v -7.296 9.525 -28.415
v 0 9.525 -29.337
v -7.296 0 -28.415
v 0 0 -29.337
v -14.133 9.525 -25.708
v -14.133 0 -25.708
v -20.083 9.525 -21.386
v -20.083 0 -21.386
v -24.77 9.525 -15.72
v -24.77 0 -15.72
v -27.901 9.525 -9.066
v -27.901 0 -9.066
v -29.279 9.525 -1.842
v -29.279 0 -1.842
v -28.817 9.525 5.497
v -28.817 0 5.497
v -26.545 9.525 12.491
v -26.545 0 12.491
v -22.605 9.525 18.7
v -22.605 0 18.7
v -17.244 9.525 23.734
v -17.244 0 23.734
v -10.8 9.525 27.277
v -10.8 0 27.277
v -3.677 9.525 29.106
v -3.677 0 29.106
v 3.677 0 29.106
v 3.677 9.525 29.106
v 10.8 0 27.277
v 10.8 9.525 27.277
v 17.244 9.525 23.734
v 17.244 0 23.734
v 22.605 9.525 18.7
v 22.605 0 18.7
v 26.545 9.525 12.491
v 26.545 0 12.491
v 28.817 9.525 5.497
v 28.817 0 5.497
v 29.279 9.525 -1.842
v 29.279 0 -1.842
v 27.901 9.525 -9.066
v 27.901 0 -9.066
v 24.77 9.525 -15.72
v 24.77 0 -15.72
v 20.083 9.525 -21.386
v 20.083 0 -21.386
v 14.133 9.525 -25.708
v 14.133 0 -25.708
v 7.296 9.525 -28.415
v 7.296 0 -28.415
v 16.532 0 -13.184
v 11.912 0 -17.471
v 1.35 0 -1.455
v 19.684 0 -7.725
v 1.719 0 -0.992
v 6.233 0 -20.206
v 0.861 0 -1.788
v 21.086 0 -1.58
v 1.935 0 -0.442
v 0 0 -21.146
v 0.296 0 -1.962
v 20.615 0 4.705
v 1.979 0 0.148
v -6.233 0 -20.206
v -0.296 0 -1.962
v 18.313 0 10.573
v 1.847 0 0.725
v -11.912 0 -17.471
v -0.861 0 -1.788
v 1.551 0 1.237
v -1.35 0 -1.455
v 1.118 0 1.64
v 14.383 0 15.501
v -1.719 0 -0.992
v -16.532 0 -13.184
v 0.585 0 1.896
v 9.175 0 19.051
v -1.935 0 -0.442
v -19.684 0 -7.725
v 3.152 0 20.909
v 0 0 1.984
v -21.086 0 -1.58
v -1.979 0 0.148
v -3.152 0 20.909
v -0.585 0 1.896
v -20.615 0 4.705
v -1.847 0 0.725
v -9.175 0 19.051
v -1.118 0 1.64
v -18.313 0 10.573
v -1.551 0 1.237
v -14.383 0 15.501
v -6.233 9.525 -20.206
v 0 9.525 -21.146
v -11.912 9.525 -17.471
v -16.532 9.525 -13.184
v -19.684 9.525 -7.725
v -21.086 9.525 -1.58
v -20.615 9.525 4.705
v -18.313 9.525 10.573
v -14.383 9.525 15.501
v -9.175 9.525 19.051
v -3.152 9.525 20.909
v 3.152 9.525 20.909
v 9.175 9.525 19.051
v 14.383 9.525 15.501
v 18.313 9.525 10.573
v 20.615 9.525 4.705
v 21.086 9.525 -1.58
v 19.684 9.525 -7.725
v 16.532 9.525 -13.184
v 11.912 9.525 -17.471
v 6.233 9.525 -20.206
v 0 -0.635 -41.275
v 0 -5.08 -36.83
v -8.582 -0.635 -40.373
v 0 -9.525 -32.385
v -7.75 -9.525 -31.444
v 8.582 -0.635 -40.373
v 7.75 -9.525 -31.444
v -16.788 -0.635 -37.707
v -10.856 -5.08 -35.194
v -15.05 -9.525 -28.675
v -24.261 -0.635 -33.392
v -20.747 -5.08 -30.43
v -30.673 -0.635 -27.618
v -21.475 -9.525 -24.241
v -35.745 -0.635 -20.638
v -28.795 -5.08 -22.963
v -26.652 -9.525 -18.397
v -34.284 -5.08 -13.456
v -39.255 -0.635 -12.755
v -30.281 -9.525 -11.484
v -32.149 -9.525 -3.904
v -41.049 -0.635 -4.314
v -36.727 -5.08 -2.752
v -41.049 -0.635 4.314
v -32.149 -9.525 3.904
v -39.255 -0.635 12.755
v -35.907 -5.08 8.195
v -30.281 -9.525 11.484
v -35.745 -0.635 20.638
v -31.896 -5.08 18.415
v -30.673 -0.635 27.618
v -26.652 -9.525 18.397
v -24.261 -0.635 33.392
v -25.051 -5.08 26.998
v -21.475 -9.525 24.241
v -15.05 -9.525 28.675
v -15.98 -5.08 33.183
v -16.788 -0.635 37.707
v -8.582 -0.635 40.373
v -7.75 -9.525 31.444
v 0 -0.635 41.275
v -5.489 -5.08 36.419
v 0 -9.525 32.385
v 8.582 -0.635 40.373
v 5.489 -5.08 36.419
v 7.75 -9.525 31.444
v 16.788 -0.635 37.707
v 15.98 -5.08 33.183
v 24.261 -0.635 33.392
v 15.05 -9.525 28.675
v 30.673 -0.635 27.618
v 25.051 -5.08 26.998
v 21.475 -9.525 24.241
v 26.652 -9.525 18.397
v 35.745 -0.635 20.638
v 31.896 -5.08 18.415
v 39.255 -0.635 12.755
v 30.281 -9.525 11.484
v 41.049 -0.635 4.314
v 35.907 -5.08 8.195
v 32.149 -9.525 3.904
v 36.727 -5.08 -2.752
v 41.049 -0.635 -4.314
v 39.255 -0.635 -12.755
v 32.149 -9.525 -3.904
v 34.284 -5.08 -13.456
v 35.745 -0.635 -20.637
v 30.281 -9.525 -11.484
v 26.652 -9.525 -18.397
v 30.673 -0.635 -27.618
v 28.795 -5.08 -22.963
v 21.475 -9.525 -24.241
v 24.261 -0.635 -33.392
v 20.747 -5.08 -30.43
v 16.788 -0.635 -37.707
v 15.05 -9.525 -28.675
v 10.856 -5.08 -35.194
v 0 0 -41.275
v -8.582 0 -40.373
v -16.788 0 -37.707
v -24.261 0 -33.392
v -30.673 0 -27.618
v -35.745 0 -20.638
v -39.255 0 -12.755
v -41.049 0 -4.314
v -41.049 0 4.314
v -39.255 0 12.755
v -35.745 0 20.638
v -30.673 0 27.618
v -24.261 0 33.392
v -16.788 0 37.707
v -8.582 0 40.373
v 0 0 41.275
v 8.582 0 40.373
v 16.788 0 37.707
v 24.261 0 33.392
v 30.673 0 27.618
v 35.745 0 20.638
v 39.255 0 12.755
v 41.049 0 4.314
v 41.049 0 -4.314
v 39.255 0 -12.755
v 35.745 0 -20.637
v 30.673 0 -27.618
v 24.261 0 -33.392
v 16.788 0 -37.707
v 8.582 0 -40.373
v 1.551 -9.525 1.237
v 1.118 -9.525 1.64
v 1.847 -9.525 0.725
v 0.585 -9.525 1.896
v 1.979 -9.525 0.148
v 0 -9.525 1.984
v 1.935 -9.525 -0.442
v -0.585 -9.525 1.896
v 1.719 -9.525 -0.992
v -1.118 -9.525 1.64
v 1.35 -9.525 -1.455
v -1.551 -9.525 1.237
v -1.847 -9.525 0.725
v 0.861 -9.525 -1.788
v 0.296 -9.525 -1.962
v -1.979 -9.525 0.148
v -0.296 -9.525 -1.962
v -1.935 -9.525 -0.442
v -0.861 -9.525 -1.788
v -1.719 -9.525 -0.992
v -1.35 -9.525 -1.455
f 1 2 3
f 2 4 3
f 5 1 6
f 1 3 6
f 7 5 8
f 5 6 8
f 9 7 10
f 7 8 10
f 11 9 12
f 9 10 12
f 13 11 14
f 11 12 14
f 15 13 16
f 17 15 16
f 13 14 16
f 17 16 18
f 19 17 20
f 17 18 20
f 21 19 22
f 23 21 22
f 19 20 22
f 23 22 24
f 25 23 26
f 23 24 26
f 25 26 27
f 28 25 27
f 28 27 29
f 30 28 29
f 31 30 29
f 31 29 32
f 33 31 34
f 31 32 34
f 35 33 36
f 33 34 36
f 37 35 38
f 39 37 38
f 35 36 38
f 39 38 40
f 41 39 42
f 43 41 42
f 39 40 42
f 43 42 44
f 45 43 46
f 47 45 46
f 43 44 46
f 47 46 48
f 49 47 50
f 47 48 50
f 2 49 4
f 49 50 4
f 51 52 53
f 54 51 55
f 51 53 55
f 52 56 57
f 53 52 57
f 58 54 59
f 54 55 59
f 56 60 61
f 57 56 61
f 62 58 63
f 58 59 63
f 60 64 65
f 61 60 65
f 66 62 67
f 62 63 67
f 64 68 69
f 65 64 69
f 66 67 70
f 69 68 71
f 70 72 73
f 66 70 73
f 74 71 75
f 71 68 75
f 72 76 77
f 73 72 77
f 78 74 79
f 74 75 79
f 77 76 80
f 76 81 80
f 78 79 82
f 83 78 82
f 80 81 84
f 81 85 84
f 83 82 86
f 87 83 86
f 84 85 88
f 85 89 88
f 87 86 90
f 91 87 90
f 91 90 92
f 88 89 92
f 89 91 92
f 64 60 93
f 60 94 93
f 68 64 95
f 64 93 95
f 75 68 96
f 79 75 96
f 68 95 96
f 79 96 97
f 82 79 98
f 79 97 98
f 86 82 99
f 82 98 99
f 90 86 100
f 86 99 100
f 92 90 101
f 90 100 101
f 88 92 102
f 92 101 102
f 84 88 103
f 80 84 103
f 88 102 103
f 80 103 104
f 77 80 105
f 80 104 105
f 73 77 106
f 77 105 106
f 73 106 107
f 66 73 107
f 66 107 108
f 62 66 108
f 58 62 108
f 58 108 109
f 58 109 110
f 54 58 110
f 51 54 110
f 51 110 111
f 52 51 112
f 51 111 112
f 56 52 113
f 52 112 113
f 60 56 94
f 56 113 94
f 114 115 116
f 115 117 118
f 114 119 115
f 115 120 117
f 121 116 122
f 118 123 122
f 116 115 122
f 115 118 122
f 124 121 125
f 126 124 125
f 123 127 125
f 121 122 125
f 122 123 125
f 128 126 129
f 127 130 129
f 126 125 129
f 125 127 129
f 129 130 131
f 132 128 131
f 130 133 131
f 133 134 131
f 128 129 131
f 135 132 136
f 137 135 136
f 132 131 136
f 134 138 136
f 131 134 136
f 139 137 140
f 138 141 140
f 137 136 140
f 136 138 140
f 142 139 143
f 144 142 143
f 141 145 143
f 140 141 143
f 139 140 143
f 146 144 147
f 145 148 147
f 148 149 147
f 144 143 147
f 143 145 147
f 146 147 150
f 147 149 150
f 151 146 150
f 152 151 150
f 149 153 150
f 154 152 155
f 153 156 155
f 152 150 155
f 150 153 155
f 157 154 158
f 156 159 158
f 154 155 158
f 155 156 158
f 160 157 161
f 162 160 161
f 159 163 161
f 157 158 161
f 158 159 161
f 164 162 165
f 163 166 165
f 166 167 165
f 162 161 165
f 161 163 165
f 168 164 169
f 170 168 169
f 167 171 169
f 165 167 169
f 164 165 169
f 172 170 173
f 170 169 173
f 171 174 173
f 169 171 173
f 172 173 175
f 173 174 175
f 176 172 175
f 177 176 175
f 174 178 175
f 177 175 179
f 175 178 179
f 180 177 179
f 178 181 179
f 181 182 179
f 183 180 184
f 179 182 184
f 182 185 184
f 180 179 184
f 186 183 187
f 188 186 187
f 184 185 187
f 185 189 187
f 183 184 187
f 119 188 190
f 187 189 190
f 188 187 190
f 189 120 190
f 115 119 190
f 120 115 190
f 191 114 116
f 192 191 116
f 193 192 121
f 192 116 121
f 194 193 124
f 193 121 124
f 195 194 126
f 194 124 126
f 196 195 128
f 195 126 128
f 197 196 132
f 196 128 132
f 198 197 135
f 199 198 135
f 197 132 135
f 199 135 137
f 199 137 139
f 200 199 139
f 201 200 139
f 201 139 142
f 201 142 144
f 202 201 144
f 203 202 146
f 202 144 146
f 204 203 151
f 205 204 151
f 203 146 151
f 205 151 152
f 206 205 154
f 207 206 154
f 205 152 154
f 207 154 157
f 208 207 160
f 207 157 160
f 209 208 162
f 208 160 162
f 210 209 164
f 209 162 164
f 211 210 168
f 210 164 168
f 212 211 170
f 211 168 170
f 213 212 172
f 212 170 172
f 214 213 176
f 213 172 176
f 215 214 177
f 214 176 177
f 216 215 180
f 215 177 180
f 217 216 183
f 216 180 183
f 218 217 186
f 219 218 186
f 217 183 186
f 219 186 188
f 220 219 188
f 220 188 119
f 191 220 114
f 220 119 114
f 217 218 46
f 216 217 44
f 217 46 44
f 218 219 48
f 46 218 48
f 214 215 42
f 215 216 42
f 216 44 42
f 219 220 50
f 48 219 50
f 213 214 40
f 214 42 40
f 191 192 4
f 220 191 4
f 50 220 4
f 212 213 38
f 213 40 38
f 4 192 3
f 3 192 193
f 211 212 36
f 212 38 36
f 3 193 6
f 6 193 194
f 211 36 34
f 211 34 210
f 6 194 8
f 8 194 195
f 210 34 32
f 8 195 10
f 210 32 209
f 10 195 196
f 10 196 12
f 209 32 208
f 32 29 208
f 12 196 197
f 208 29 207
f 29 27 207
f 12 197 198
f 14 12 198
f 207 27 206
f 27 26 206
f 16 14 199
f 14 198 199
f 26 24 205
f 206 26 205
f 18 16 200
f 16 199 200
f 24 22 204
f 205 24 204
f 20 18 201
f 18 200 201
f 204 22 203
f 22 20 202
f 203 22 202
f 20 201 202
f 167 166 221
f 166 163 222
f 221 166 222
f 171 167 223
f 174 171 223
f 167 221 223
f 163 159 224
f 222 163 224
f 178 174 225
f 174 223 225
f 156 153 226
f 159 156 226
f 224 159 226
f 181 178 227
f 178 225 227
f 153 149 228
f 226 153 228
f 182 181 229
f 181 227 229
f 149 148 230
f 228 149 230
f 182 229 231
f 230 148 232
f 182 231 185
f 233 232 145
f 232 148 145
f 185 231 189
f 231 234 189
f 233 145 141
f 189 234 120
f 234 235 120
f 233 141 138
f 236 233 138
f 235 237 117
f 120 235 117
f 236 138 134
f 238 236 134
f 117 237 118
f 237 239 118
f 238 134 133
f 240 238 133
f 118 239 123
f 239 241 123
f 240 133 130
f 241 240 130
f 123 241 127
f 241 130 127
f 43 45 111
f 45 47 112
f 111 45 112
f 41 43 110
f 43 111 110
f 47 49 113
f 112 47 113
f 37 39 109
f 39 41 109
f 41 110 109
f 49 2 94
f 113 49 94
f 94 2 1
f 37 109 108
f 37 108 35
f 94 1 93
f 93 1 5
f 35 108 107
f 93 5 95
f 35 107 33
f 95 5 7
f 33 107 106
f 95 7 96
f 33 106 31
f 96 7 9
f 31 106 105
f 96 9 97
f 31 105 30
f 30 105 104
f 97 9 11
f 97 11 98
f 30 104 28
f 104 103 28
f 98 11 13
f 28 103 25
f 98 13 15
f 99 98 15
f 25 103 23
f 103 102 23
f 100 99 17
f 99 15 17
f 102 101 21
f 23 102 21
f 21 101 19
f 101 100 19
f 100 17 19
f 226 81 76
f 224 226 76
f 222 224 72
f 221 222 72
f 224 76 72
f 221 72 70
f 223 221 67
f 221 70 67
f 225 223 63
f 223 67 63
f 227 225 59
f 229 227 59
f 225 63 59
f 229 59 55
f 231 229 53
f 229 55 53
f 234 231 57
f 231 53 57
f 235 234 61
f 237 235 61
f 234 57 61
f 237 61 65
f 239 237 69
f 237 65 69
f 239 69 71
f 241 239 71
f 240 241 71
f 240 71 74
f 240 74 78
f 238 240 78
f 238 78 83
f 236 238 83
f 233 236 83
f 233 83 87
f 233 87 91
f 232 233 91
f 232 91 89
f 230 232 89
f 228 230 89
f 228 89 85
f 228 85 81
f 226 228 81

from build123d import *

# Parameters (mm, degrees)
CHAMFER1_SIZE                   = 8.89
F_5_32_0_15625_DIAMETER_HOLE1_D = 3.96875


with BuildPart() as part:
    # Sketch1 → Revolve1 (revolve)
    with BuildSketch(Plane.XY, mode=Mode.PRIVATE) as revolve1_sk:
        Polygon((-29.337, 0), (-41.275, 0), (-41.275, -9.525), (0, -9.525), (0, 0), (-21.1455, 0), (-21.1455, 9.525), (-29.337, 9.525), align=None)
    revolve(revolve1_sk.sketch.rotate(Axis((0, -9.525, 0), (0, 1, 0)), 270), axis=Axis((0, -9.525, 0), (0, 1, 0)))

    # Chamfer1
    chamfer1_edges = [part.edges().sort_by_distance(p)[0] for p in [
        (0, -9.525, 41.275),
    ]]
    chamfer(chamfer1_edges, length=CHAMFER1_SIZE)

    # 5/32 (0.15625) Diameter Hole1 (through all)
    with Locations(Plane(origin=(0, -9.525, 0), x_dir=(0, 0, -1), z_dir=(0, -1, 0))):
        with Locations((0, 0)):
            Hole(F_5_32_0_15625_DIAMETER_HOLE1_D / 2)


solid = part.part
